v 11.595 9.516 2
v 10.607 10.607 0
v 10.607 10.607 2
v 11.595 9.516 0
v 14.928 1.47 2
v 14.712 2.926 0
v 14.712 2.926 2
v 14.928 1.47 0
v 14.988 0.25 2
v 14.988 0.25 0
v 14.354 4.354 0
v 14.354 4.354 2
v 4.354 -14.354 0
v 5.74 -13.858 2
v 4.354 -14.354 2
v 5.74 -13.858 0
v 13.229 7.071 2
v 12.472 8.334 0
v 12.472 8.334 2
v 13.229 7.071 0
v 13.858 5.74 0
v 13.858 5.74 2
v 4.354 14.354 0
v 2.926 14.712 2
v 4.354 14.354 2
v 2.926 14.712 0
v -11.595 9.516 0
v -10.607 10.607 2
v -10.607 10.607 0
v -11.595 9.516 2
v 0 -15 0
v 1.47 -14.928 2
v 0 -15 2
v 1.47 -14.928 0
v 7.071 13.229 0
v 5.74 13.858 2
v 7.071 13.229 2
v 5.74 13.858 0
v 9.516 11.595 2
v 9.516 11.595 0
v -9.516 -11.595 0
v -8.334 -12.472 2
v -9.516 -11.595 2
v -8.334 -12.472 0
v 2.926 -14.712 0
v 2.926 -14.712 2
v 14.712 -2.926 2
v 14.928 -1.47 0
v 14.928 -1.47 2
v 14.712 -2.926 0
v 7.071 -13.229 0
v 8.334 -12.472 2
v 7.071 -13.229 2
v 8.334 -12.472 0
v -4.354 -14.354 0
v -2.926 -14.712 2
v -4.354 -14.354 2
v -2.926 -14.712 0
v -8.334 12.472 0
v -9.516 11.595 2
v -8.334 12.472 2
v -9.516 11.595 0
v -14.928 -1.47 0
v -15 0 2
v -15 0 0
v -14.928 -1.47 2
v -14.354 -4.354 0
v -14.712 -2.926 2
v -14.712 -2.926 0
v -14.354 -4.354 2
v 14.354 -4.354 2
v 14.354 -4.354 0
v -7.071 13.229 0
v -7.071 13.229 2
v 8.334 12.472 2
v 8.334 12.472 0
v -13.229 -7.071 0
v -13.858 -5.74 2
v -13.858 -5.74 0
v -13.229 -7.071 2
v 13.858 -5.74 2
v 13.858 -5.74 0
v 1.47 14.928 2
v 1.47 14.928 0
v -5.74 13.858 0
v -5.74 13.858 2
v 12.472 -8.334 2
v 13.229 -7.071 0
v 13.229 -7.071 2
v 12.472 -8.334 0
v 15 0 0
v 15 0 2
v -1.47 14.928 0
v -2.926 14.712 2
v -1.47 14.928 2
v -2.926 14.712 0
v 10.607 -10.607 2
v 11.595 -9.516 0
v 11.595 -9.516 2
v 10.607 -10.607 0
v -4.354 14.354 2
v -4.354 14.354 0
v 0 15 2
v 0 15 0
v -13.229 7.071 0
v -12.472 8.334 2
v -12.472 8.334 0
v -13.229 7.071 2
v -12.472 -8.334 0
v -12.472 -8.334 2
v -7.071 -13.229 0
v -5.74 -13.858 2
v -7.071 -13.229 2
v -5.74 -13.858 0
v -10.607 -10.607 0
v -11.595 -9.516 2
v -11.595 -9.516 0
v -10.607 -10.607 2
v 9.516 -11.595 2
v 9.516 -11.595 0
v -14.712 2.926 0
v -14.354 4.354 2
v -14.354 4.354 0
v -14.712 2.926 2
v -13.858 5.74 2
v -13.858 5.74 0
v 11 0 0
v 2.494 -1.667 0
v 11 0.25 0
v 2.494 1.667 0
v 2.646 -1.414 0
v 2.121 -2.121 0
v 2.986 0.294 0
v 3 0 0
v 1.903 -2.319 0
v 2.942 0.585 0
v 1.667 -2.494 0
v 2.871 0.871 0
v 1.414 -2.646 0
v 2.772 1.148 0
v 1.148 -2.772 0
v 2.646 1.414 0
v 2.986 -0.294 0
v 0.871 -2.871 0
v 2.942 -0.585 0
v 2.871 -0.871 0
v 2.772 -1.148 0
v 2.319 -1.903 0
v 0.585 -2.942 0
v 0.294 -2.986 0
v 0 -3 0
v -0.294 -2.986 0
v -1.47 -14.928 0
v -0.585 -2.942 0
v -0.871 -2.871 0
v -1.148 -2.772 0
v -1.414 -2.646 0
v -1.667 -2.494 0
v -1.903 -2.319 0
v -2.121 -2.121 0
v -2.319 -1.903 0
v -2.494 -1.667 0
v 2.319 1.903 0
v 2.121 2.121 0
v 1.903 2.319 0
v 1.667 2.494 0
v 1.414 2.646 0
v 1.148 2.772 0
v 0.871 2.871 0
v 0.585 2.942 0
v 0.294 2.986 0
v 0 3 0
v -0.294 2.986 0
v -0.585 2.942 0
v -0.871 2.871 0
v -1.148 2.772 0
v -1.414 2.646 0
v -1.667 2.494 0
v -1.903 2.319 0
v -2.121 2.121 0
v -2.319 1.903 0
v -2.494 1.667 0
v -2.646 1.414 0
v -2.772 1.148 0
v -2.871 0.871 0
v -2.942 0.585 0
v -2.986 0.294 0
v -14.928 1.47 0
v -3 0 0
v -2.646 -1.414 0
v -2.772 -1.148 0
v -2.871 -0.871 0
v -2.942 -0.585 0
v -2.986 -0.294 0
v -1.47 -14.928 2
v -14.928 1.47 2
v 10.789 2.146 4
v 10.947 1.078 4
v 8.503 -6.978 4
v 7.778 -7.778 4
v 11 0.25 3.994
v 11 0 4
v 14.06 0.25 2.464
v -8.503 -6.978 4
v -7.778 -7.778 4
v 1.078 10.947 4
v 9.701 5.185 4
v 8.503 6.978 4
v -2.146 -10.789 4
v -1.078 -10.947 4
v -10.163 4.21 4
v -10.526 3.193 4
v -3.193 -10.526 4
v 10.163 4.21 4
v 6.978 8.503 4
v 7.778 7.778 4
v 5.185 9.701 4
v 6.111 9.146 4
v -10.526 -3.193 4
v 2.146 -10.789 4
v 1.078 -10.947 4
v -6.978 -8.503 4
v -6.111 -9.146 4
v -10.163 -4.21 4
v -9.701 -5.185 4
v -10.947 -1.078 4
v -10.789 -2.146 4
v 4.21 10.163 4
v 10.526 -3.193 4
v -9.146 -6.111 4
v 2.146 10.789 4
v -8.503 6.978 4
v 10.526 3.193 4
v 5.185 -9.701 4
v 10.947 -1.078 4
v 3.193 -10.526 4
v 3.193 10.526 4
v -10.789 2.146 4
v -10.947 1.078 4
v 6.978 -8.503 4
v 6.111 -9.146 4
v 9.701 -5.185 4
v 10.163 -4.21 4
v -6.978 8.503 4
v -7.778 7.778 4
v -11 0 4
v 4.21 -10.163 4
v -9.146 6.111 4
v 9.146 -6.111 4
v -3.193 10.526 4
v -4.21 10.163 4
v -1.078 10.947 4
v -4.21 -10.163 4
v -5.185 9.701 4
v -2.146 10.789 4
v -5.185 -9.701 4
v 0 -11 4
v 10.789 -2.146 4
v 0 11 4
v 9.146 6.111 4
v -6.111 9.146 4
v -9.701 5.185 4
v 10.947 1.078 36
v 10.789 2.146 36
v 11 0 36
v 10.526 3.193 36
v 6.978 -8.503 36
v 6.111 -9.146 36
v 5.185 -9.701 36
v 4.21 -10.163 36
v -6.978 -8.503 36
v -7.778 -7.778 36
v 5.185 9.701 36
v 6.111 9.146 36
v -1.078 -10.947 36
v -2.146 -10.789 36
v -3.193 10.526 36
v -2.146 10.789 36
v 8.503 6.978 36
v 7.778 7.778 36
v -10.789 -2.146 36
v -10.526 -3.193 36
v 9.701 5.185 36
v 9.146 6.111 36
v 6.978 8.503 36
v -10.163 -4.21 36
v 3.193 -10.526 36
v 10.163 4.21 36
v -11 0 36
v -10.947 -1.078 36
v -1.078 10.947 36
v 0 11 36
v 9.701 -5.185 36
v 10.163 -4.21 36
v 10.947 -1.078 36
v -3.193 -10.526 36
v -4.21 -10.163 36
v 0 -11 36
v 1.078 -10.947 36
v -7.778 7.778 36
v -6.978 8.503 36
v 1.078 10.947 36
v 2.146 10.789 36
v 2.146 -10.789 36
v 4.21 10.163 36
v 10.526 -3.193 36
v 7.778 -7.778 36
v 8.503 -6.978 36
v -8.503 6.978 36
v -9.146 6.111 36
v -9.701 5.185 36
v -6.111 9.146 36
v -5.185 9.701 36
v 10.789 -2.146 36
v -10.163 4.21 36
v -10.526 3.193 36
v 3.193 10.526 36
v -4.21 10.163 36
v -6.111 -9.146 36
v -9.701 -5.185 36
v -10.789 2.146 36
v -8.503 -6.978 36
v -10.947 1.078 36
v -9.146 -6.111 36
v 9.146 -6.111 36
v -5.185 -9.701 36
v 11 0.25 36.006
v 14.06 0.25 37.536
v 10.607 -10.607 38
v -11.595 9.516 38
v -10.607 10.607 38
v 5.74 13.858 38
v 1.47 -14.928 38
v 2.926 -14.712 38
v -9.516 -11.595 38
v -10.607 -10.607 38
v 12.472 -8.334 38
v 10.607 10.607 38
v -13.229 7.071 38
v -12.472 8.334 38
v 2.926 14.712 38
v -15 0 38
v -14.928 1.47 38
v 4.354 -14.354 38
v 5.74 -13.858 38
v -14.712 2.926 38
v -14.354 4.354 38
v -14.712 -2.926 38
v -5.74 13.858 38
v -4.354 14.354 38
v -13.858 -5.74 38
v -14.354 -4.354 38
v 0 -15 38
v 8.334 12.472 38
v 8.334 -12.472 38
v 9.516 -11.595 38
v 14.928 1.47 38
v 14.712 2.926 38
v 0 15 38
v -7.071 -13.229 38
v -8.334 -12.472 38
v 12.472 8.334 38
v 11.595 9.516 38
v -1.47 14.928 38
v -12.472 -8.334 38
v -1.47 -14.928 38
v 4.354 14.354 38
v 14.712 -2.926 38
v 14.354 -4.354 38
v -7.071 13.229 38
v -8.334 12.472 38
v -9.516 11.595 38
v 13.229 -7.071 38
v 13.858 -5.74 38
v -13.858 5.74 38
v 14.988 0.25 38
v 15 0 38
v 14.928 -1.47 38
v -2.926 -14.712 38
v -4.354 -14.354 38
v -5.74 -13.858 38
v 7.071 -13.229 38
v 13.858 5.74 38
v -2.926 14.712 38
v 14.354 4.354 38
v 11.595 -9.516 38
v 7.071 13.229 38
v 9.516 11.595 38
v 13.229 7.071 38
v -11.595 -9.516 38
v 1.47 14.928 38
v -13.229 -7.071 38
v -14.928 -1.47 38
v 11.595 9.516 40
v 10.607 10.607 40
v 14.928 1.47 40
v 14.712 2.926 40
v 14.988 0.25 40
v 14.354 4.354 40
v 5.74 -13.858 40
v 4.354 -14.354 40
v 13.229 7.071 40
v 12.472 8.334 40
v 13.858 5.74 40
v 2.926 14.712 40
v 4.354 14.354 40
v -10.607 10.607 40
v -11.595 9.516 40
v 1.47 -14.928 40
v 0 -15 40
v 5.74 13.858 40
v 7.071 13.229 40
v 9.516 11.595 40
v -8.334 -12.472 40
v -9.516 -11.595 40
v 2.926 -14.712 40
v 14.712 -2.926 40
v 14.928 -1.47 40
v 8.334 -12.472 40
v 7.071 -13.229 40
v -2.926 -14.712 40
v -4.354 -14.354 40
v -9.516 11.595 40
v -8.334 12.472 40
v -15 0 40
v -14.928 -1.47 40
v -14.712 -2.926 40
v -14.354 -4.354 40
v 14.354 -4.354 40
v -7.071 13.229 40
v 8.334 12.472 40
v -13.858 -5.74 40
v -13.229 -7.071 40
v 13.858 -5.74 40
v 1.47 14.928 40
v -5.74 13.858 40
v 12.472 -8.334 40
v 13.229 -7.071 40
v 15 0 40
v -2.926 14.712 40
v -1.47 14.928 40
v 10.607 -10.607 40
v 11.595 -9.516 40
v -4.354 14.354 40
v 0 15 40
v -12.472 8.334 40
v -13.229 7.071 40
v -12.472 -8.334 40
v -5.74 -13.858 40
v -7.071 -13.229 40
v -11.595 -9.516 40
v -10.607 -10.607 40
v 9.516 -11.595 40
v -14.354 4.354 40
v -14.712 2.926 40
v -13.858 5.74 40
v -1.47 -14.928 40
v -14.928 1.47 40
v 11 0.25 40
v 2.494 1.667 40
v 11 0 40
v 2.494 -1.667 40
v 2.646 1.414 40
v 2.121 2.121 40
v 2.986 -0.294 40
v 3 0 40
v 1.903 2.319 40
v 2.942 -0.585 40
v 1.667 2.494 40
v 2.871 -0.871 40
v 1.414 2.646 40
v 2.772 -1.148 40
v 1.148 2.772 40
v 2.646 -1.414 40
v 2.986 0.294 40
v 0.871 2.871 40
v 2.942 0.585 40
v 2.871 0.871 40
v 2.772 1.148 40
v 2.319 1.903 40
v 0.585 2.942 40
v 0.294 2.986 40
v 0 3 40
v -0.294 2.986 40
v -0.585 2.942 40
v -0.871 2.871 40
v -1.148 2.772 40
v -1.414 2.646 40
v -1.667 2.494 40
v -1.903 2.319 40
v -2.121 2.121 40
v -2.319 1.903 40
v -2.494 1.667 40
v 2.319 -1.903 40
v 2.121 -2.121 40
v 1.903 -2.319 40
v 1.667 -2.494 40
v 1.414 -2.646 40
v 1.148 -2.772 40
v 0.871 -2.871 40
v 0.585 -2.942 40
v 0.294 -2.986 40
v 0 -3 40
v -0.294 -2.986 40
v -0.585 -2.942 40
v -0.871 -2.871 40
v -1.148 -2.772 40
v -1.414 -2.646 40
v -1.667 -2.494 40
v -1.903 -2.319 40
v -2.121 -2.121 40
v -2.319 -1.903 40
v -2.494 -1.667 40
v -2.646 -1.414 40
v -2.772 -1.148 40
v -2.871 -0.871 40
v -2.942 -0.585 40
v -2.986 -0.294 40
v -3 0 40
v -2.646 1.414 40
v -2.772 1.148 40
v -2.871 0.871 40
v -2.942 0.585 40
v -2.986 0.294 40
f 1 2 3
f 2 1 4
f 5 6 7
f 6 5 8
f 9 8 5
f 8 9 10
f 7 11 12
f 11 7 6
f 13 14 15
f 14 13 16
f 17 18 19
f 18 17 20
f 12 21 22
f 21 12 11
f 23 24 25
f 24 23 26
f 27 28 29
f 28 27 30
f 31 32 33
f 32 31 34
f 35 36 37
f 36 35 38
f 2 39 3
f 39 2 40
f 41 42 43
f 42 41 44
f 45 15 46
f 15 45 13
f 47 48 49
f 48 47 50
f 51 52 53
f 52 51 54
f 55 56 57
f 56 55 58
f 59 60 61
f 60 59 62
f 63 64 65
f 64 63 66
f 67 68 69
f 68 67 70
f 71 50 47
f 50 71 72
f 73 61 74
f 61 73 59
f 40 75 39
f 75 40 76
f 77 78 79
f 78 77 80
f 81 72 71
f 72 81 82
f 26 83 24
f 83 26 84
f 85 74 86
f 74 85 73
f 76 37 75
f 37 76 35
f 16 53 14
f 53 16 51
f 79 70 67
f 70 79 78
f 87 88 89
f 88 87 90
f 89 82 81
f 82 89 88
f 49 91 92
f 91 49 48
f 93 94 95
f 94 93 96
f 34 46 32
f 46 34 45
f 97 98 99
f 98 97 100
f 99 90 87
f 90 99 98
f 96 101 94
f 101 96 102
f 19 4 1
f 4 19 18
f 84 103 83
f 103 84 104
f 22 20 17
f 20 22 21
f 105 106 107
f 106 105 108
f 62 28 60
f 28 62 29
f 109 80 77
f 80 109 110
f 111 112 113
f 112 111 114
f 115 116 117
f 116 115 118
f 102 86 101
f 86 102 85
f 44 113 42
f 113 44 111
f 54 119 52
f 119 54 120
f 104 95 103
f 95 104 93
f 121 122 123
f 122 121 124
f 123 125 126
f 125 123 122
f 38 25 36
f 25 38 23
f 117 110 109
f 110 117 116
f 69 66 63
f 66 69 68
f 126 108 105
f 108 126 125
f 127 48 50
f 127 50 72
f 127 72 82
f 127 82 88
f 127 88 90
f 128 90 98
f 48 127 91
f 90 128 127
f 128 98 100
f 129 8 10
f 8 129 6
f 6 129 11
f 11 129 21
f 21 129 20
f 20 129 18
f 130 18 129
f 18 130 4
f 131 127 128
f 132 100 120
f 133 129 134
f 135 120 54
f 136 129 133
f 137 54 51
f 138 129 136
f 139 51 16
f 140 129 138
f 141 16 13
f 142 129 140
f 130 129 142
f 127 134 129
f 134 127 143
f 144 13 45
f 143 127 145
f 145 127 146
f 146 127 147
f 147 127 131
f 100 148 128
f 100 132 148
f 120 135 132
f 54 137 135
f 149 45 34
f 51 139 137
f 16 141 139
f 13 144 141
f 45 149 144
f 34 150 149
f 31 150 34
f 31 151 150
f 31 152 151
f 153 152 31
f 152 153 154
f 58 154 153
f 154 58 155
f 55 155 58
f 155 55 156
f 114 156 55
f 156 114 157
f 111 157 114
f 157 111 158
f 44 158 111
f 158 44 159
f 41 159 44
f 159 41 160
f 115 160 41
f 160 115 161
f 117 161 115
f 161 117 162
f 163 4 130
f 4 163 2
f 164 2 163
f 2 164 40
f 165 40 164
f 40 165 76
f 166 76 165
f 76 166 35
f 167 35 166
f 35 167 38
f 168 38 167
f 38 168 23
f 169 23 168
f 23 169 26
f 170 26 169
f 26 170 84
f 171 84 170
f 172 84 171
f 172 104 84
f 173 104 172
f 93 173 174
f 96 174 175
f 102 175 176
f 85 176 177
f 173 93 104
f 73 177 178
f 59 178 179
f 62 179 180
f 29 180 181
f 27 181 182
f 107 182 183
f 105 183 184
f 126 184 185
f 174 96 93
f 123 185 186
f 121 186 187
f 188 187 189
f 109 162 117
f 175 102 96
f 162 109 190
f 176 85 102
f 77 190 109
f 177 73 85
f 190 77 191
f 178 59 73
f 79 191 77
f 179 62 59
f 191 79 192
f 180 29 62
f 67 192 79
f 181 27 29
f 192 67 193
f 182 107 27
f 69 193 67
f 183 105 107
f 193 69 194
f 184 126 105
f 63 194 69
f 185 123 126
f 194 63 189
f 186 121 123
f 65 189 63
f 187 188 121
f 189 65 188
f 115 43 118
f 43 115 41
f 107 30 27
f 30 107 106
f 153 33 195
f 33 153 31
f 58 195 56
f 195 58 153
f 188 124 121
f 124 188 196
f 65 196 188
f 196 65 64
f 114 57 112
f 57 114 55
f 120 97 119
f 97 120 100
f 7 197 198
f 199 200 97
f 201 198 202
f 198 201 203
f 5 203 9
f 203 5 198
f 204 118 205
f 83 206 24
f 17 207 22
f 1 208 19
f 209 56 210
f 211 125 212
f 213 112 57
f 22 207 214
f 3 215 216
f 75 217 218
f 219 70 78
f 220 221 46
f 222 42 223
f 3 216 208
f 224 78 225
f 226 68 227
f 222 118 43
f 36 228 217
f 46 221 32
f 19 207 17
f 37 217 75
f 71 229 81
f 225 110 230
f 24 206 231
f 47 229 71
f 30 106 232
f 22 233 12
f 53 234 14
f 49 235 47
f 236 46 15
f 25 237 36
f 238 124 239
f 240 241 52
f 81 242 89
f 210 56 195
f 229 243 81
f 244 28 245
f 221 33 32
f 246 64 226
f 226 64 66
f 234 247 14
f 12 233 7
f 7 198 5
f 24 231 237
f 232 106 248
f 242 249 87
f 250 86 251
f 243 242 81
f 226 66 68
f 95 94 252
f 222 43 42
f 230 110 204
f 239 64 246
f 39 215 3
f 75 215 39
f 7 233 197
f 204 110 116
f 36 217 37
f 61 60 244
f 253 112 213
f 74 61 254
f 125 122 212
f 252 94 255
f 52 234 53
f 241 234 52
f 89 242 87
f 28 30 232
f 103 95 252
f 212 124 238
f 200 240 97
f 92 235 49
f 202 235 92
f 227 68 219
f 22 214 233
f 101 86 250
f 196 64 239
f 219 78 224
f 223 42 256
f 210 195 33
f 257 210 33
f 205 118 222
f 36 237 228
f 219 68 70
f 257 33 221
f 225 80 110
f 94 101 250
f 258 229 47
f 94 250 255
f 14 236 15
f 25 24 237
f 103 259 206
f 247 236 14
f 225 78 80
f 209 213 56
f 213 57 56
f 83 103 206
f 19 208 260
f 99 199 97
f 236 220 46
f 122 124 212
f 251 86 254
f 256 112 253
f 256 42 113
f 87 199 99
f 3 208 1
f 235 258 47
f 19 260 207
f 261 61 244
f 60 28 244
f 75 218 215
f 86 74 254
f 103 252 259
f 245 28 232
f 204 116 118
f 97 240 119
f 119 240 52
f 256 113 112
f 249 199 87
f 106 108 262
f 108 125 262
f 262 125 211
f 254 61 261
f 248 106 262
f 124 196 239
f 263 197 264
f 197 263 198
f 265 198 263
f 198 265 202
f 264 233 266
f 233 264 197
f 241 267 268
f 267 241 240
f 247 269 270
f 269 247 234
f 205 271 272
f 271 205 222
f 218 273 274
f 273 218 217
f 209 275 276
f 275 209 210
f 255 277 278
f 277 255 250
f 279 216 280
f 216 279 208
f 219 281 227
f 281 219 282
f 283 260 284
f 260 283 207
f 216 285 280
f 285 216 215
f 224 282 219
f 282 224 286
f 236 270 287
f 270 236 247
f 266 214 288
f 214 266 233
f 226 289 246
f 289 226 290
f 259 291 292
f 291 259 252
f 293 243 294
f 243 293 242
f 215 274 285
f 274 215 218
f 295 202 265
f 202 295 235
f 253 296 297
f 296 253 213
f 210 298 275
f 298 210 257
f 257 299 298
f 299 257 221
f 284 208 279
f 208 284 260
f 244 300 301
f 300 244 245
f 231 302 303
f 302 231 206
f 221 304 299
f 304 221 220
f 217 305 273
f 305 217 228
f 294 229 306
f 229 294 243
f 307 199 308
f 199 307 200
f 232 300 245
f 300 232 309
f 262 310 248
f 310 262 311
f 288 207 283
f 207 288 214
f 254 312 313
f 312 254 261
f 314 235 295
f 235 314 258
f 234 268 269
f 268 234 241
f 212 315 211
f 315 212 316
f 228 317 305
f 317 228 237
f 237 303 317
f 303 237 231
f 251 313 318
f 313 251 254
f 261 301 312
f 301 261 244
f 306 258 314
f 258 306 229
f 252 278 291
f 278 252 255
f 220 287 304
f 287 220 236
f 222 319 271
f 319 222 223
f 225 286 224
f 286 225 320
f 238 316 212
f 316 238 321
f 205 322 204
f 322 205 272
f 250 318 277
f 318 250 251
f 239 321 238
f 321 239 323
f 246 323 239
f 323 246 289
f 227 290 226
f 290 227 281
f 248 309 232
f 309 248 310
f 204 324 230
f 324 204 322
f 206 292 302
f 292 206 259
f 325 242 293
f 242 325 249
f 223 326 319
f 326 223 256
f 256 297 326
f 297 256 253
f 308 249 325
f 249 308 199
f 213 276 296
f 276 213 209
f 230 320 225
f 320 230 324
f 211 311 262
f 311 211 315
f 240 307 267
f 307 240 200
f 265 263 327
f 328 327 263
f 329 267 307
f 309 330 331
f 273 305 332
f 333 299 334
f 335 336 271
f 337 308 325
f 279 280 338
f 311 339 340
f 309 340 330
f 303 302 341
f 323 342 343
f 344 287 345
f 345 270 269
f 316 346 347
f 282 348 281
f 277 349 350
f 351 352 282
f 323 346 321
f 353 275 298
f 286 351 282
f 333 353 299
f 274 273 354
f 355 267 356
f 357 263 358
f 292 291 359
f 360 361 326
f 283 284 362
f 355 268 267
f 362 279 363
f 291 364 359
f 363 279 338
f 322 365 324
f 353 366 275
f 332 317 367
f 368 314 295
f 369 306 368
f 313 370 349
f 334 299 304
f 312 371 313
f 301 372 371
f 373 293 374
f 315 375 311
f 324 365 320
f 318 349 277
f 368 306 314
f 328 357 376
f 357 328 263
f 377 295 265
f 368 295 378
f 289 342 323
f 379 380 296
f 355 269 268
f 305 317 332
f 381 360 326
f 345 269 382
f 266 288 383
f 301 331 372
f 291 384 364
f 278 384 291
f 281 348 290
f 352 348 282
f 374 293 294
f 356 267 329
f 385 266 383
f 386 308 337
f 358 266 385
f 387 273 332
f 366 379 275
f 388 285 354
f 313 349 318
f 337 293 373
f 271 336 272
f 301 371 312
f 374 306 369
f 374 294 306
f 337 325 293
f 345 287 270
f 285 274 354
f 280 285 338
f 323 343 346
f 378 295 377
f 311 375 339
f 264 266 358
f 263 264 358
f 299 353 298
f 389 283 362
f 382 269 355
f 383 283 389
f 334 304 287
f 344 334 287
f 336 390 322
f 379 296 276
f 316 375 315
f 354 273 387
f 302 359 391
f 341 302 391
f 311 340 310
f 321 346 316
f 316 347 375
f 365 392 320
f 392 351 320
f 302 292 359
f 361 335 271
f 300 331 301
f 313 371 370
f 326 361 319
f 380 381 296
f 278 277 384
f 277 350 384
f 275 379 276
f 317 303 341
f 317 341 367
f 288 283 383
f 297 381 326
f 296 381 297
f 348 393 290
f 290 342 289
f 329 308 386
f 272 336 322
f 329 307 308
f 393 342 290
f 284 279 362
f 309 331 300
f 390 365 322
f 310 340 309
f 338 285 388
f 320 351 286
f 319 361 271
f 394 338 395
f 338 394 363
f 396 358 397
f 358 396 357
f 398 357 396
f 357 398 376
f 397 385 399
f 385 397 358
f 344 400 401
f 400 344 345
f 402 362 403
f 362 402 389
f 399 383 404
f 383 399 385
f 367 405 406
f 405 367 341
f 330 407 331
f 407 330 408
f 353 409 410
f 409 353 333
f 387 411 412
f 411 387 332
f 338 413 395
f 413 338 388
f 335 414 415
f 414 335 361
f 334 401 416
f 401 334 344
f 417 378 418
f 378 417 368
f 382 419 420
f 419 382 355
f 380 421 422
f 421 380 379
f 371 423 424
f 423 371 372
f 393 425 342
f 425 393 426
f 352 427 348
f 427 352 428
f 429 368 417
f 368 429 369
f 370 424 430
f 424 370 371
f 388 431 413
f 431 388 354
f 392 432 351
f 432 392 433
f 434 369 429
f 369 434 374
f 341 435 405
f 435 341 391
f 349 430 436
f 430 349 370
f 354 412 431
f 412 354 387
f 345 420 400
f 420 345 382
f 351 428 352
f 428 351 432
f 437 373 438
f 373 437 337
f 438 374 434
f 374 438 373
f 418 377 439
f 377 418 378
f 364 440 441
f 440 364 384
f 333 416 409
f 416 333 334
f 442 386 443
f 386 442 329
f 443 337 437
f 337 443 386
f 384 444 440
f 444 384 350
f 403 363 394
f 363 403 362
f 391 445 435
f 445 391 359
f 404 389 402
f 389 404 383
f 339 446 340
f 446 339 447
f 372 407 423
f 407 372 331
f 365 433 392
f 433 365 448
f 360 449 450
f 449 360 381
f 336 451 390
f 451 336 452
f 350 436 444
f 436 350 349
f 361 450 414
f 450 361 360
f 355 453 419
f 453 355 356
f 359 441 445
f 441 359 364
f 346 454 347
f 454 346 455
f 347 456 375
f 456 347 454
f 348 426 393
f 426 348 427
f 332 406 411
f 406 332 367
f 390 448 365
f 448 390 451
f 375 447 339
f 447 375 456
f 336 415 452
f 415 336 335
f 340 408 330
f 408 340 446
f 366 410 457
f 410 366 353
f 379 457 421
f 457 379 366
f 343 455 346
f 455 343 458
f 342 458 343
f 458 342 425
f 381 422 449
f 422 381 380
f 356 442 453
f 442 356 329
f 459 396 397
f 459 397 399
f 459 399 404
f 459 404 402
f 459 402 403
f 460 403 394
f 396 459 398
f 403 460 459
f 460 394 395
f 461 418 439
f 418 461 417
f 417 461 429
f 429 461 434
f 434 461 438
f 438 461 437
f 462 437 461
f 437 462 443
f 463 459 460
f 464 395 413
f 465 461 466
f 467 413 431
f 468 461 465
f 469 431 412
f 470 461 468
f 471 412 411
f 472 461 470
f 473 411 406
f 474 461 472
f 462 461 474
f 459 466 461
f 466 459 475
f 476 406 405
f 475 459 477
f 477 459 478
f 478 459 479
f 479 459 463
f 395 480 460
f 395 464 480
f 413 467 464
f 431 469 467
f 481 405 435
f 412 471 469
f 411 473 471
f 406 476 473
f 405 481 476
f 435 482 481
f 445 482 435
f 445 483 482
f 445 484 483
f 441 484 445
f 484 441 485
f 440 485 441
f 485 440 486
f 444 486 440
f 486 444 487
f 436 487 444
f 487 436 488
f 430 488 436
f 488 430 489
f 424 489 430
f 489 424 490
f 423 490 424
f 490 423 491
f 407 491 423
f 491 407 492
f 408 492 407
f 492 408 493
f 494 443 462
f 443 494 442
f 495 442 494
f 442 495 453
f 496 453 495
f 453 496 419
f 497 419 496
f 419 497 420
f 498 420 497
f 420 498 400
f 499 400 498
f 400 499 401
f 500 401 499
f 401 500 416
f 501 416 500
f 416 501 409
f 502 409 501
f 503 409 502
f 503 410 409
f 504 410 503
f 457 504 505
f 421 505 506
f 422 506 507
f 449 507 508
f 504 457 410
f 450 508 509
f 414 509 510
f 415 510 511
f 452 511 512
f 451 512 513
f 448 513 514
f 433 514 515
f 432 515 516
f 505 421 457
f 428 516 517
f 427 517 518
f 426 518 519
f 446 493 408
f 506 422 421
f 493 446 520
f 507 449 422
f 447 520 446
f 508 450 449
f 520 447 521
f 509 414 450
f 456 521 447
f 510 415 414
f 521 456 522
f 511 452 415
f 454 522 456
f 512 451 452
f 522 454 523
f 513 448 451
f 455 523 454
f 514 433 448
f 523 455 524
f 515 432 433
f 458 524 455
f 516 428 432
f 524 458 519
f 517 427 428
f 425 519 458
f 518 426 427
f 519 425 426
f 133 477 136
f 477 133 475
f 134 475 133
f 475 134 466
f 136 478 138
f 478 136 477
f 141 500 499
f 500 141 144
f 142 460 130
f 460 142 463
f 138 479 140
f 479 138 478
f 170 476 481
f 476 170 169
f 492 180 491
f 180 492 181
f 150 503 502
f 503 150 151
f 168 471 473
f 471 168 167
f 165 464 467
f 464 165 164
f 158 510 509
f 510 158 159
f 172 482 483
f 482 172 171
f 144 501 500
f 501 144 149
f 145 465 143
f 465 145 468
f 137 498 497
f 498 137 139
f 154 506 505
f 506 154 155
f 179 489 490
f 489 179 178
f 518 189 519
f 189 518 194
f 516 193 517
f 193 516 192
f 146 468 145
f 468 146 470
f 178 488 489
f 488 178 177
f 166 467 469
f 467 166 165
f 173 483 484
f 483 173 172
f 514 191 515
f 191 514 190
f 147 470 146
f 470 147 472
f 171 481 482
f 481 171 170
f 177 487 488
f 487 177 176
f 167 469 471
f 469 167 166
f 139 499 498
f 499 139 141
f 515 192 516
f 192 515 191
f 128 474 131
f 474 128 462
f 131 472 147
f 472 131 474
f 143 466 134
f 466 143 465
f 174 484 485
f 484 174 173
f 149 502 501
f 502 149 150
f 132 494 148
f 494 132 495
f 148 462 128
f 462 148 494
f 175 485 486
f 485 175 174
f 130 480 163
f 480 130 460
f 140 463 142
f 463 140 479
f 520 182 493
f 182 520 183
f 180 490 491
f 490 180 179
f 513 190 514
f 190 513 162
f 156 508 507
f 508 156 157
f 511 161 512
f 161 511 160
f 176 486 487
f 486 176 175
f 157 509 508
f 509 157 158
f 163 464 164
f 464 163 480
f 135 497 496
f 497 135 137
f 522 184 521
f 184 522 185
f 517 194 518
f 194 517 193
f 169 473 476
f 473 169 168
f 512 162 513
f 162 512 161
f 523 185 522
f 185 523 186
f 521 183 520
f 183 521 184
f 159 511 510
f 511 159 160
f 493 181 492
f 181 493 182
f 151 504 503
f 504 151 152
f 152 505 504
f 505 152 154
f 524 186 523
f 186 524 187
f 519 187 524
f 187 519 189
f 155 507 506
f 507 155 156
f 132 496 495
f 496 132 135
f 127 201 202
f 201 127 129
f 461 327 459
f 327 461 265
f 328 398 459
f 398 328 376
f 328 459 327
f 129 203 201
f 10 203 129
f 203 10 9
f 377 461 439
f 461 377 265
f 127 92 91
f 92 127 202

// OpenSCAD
/*
  Module: thread_spool

  Description: This module creates a spool used for winding thread. The
  spool is constructed so that there are beveled sides that slope inward
  toward a center cylinder. The parameters include the following.

  diameter - the outer diameter of the spool.
  height - the outer height of the spool including the bevel edges.
  depth - depth of the bevel. Inner cylinder diameter = diameter - depthx2
  hole_radius - radius of center hole

  Date Created: 2014-07-27
  
  Created by: Charles Bell
*/
module thread_spool(diameter=30,height=40,depth=3,hole_radius=3) {
  radius = diameter/2;
  center_height = height-8;
  difference() {
    union() {
      // bottom
      cylinder(2,radius,radius,$fn=64);
      translate([0,0,2]) cylinder(2,radius,radius-depth,$fn=64); 
      // center
      translate([0,0,4]) cylinder(height-8,radius-depth,radius-depth,$fn=64);
      // top
      translate([0,0,height-4]) cylinder(2,radius-depth,radius,$fn=64);
      translate([0,0,height-2]) cylinder(2,radius,radius,$fn=64);
    }
    // hole
    cylinder(height,hole_radius,hole_radius,$fn=64);
    // cut
    translate([(diameter/2)-depth,0,0]) cube([depth,0.25,height]);
  }
}

thread_spool(30,40,4);
